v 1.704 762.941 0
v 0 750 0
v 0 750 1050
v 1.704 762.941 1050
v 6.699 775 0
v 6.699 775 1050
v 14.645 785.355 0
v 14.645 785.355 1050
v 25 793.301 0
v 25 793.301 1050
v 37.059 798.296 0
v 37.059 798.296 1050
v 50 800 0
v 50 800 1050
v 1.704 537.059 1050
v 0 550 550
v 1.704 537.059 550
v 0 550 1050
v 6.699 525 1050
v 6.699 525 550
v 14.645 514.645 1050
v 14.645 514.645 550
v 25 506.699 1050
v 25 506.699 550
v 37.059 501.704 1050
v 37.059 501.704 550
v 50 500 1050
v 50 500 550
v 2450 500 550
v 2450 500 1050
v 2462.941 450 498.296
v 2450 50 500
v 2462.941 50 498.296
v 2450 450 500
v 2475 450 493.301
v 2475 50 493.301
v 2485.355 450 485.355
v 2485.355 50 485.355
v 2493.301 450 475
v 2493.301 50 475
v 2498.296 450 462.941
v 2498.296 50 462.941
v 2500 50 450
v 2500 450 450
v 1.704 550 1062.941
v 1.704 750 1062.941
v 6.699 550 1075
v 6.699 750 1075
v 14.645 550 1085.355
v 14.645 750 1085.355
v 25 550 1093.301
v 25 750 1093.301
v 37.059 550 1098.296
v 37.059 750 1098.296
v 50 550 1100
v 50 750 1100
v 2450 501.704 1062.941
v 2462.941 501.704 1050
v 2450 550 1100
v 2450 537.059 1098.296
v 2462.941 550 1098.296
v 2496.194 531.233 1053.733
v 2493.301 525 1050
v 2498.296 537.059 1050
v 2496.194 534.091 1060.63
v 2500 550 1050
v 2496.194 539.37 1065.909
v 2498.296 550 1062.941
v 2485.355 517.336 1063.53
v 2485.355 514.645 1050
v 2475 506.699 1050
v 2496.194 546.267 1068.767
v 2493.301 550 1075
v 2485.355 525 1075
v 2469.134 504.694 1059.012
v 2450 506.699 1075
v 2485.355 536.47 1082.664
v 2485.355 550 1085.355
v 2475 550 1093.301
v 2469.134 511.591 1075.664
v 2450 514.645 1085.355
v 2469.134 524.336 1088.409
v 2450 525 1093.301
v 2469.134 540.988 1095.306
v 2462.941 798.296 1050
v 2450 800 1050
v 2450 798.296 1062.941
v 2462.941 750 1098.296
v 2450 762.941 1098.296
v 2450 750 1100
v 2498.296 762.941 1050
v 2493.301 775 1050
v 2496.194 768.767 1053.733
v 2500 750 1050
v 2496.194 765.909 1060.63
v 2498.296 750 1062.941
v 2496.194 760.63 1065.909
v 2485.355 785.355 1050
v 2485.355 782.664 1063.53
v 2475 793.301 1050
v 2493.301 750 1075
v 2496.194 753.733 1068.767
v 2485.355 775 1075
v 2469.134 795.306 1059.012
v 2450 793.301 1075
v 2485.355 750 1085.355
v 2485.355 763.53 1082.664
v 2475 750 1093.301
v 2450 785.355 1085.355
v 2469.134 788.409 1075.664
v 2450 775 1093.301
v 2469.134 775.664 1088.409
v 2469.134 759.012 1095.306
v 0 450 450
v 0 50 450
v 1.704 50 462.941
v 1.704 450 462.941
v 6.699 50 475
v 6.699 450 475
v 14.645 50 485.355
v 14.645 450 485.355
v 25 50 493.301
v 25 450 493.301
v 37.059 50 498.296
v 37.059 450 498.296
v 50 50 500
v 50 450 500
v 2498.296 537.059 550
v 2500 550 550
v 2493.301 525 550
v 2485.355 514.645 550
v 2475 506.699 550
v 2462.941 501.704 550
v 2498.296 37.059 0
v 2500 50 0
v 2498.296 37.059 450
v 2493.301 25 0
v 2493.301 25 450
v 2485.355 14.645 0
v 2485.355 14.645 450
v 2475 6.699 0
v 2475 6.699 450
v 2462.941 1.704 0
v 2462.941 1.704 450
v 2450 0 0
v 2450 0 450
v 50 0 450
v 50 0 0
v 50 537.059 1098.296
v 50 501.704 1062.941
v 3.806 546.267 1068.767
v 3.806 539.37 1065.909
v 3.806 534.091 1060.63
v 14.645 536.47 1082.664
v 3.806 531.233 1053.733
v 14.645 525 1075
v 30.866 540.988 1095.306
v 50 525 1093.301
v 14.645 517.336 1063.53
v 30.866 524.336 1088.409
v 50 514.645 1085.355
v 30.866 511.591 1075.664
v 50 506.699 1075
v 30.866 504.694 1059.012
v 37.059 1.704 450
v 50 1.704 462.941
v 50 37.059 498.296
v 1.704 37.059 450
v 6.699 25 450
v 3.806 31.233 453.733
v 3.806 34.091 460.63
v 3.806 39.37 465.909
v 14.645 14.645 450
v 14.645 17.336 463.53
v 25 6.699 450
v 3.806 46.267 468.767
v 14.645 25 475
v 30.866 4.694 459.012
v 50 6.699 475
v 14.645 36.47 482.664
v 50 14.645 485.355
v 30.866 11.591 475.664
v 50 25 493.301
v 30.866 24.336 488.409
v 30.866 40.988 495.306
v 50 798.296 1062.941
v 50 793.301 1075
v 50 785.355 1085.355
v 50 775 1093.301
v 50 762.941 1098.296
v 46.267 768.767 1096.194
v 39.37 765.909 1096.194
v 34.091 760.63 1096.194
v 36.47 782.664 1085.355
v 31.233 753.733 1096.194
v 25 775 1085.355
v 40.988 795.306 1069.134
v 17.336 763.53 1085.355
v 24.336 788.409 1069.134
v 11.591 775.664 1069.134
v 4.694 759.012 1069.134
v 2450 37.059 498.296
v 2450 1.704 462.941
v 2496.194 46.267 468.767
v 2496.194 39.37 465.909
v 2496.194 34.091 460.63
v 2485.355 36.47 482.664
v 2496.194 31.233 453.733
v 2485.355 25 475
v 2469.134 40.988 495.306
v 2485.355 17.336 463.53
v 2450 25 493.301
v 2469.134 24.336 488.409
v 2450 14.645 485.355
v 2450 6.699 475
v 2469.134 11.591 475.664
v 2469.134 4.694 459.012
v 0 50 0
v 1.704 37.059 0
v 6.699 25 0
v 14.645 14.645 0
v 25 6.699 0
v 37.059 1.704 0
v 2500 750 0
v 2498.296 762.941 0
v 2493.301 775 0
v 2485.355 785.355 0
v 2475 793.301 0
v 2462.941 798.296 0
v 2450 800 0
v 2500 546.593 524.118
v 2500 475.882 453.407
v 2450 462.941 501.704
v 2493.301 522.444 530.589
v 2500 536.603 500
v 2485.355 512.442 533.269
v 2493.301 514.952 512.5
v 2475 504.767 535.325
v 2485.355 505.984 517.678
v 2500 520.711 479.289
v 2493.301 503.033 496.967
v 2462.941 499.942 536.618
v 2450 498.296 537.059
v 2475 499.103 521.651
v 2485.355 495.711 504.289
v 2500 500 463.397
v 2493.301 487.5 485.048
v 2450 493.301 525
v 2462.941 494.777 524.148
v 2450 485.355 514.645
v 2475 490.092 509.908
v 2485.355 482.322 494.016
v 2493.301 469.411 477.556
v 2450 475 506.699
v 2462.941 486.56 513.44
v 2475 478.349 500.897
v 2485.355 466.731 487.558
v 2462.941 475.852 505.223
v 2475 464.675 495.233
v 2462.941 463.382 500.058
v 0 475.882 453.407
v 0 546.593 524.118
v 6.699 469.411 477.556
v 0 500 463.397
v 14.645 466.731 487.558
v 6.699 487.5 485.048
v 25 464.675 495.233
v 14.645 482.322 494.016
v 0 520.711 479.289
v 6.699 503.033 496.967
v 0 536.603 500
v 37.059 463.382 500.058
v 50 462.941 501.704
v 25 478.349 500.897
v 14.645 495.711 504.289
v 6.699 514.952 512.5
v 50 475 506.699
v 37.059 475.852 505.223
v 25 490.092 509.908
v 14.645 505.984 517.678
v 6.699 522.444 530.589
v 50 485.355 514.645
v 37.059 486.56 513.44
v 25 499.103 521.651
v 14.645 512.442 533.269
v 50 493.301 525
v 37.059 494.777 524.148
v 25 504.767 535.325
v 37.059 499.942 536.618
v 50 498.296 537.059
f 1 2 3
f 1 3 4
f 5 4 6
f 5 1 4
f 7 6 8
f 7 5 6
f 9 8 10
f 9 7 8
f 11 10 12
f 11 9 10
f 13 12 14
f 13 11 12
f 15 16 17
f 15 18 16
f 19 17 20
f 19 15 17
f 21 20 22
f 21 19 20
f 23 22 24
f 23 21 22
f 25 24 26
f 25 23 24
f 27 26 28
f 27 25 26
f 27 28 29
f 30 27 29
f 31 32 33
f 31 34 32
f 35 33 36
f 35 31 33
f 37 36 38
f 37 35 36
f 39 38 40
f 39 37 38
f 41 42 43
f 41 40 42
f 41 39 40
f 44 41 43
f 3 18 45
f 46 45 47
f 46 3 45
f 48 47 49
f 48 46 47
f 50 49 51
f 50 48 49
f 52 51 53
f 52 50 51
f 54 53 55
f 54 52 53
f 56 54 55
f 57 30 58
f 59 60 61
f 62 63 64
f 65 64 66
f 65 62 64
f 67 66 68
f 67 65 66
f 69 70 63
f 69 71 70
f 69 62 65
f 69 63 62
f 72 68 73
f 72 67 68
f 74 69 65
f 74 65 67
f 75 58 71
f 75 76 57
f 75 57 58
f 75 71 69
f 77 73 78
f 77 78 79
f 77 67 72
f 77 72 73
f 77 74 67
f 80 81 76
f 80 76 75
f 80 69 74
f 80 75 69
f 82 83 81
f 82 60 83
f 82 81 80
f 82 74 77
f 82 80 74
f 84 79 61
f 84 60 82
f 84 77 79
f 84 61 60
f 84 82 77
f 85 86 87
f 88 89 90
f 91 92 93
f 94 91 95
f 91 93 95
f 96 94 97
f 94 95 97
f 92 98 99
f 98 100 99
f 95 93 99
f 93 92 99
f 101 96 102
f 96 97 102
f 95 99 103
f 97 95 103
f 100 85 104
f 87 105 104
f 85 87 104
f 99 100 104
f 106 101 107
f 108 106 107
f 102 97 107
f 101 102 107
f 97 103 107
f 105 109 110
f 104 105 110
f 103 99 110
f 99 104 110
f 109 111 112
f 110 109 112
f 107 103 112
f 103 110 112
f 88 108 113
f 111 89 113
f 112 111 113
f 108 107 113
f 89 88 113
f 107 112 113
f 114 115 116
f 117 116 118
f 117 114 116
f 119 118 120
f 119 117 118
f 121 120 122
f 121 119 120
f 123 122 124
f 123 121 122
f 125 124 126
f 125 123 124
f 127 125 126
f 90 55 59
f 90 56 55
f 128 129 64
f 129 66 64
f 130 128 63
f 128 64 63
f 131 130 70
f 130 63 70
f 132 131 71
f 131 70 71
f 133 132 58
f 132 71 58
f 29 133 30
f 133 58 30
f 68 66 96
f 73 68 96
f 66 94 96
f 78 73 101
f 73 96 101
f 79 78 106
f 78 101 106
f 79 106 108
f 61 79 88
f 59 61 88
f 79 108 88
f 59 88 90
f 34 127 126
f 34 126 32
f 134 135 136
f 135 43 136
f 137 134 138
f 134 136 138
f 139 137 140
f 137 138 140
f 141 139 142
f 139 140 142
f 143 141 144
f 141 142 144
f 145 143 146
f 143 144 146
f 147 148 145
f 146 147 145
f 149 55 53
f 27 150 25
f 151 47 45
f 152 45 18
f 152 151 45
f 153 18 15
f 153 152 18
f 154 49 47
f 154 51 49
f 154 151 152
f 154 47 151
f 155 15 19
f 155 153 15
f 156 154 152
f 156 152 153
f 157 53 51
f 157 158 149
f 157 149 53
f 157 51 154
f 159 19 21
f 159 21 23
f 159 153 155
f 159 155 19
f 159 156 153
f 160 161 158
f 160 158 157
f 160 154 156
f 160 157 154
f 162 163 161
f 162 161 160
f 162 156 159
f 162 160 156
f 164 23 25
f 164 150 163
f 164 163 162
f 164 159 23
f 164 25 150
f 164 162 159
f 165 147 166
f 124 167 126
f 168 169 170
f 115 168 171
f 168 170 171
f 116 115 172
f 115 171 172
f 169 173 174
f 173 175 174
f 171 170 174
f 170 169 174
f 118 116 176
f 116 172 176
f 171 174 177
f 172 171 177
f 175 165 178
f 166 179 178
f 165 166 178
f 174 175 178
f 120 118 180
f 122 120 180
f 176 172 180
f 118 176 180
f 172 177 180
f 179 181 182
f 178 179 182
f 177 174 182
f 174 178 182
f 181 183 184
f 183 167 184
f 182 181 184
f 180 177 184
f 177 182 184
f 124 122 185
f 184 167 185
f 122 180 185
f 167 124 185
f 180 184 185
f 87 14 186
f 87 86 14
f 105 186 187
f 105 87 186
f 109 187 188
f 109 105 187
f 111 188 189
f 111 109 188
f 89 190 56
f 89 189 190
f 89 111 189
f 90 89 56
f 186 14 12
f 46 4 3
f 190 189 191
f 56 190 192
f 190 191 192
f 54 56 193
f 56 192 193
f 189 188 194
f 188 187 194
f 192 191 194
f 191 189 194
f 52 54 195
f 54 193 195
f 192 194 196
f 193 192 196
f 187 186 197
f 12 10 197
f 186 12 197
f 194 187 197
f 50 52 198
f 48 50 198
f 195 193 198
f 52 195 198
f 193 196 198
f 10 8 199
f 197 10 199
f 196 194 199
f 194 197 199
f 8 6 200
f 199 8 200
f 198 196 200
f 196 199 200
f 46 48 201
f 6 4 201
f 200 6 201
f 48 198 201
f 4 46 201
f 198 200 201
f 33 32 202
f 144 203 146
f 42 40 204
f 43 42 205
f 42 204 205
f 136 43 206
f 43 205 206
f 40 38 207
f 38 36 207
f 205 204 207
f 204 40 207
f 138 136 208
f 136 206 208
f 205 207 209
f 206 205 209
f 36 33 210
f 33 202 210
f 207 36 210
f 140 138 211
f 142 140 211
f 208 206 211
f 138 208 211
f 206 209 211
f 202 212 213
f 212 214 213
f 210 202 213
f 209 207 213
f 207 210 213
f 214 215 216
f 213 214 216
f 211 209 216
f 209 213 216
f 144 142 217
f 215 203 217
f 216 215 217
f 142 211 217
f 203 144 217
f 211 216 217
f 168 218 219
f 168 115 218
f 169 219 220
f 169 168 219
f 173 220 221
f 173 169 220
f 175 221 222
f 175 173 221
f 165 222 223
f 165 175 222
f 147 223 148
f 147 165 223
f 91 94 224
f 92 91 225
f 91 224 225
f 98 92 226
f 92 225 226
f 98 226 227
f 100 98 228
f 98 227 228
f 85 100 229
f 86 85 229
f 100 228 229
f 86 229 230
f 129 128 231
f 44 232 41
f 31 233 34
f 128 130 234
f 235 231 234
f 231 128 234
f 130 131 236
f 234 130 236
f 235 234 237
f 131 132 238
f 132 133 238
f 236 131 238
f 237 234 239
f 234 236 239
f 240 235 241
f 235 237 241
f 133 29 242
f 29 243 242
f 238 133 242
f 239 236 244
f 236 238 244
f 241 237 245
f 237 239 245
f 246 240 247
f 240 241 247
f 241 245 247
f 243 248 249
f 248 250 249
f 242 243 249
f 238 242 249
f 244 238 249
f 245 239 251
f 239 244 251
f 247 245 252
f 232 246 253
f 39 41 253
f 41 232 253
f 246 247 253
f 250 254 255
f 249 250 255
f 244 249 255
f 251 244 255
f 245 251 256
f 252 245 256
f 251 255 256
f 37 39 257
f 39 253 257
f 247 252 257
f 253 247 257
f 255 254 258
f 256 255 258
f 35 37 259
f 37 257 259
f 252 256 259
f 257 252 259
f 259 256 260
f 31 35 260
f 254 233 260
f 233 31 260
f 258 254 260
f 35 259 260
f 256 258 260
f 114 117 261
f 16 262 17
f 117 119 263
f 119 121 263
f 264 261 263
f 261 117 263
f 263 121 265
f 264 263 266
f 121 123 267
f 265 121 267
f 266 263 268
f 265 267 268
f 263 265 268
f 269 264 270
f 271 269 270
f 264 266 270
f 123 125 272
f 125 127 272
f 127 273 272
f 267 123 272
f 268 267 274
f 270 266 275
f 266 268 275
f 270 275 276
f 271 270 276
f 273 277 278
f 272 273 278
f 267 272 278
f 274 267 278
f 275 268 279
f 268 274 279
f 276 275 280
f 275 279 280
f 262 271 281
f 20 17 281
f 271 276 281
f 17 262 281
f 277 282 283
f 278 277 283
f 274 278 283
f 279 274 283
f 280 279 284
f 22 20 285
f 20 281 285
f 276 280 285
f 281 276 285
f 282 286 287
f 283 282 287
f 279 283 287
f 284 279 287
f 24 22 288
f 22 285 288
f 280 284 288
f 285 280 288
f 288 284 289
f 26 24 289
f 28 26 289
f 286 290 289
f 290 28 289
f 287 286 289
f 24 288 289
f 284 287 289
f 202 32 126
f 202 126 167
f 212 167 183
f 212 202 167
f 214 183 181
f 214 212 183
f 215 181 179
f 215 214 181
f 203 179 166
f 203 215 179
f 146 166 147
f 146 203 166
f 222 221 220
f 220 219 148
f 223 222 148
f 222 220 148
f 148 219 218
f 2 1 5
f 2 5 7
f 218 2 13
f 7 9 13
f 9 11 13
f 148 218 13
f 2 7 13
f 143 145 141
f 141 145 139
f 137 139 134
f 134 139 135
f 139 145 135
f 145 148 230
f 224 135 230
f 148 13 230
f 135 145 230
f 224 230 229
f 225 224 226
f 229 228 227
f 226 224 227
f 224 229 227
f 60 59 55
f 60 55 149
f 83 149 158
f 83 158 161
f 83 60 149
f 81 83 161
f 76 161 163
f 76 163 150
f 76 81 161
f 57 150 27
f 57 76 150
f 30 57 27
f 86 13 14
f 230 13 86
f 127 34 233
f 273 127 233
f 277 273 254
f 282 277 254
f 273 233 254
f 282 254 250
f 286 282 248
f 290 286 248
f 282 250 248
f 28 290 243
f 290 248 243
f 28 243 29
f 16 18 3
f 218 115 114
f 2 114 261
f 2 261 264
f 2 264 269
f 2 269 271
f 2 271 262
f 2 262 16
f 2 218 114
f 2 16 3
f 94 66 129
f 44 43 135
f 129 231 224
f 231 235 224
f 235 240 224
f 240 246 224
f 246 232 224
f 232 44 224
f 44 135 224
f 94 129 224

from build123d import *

# Parameters (mm, degrees)
F0_W     = 2500
F0_H     = 800
F1_DEPTH = 500
F2_W     = 2500
F2_H     = 300
F3_DEPTH = 600
F4_R     = 50


with BuildPart() as f1:
    # F0 (on Top) → F1 (new body)
    with BuildSketch(Plane.XY):
        with Locations((1250, 400)):
            Rectangle(F0_W, F0_H)
    extrude(amount=F1_DEPTH)

    # F2 (on face) → F3 (join)
    with BuildSketch(Plane.XY.offset(500)):
        with Locations((1250, 650)):
            Rectangle(F2_W, F2_H)
    extrude(amount=F3_DEPTH)

    # F4
    f4_edges = [f1.edges().sort_by_distance(p)[0] for p in [
        (1250, 500, 500),
        (1250, 0, 500),
        (0, 0, 250),
        (0, 250, 500),
        (0, 800, 550),
        (1250, 500, 1100),
        (1250, 800, 1100),
        (2500, 500, 800),
        (2500, 250, 500),
        (2500, 0, 250),
        (2500, 800, 550),
        (2500, 650, 1100),
        (0, 650, 1100),
        (0, 500, 800),
    ]]
    fillet(f4_edges, radius=F4_R)


solid = f1.part
